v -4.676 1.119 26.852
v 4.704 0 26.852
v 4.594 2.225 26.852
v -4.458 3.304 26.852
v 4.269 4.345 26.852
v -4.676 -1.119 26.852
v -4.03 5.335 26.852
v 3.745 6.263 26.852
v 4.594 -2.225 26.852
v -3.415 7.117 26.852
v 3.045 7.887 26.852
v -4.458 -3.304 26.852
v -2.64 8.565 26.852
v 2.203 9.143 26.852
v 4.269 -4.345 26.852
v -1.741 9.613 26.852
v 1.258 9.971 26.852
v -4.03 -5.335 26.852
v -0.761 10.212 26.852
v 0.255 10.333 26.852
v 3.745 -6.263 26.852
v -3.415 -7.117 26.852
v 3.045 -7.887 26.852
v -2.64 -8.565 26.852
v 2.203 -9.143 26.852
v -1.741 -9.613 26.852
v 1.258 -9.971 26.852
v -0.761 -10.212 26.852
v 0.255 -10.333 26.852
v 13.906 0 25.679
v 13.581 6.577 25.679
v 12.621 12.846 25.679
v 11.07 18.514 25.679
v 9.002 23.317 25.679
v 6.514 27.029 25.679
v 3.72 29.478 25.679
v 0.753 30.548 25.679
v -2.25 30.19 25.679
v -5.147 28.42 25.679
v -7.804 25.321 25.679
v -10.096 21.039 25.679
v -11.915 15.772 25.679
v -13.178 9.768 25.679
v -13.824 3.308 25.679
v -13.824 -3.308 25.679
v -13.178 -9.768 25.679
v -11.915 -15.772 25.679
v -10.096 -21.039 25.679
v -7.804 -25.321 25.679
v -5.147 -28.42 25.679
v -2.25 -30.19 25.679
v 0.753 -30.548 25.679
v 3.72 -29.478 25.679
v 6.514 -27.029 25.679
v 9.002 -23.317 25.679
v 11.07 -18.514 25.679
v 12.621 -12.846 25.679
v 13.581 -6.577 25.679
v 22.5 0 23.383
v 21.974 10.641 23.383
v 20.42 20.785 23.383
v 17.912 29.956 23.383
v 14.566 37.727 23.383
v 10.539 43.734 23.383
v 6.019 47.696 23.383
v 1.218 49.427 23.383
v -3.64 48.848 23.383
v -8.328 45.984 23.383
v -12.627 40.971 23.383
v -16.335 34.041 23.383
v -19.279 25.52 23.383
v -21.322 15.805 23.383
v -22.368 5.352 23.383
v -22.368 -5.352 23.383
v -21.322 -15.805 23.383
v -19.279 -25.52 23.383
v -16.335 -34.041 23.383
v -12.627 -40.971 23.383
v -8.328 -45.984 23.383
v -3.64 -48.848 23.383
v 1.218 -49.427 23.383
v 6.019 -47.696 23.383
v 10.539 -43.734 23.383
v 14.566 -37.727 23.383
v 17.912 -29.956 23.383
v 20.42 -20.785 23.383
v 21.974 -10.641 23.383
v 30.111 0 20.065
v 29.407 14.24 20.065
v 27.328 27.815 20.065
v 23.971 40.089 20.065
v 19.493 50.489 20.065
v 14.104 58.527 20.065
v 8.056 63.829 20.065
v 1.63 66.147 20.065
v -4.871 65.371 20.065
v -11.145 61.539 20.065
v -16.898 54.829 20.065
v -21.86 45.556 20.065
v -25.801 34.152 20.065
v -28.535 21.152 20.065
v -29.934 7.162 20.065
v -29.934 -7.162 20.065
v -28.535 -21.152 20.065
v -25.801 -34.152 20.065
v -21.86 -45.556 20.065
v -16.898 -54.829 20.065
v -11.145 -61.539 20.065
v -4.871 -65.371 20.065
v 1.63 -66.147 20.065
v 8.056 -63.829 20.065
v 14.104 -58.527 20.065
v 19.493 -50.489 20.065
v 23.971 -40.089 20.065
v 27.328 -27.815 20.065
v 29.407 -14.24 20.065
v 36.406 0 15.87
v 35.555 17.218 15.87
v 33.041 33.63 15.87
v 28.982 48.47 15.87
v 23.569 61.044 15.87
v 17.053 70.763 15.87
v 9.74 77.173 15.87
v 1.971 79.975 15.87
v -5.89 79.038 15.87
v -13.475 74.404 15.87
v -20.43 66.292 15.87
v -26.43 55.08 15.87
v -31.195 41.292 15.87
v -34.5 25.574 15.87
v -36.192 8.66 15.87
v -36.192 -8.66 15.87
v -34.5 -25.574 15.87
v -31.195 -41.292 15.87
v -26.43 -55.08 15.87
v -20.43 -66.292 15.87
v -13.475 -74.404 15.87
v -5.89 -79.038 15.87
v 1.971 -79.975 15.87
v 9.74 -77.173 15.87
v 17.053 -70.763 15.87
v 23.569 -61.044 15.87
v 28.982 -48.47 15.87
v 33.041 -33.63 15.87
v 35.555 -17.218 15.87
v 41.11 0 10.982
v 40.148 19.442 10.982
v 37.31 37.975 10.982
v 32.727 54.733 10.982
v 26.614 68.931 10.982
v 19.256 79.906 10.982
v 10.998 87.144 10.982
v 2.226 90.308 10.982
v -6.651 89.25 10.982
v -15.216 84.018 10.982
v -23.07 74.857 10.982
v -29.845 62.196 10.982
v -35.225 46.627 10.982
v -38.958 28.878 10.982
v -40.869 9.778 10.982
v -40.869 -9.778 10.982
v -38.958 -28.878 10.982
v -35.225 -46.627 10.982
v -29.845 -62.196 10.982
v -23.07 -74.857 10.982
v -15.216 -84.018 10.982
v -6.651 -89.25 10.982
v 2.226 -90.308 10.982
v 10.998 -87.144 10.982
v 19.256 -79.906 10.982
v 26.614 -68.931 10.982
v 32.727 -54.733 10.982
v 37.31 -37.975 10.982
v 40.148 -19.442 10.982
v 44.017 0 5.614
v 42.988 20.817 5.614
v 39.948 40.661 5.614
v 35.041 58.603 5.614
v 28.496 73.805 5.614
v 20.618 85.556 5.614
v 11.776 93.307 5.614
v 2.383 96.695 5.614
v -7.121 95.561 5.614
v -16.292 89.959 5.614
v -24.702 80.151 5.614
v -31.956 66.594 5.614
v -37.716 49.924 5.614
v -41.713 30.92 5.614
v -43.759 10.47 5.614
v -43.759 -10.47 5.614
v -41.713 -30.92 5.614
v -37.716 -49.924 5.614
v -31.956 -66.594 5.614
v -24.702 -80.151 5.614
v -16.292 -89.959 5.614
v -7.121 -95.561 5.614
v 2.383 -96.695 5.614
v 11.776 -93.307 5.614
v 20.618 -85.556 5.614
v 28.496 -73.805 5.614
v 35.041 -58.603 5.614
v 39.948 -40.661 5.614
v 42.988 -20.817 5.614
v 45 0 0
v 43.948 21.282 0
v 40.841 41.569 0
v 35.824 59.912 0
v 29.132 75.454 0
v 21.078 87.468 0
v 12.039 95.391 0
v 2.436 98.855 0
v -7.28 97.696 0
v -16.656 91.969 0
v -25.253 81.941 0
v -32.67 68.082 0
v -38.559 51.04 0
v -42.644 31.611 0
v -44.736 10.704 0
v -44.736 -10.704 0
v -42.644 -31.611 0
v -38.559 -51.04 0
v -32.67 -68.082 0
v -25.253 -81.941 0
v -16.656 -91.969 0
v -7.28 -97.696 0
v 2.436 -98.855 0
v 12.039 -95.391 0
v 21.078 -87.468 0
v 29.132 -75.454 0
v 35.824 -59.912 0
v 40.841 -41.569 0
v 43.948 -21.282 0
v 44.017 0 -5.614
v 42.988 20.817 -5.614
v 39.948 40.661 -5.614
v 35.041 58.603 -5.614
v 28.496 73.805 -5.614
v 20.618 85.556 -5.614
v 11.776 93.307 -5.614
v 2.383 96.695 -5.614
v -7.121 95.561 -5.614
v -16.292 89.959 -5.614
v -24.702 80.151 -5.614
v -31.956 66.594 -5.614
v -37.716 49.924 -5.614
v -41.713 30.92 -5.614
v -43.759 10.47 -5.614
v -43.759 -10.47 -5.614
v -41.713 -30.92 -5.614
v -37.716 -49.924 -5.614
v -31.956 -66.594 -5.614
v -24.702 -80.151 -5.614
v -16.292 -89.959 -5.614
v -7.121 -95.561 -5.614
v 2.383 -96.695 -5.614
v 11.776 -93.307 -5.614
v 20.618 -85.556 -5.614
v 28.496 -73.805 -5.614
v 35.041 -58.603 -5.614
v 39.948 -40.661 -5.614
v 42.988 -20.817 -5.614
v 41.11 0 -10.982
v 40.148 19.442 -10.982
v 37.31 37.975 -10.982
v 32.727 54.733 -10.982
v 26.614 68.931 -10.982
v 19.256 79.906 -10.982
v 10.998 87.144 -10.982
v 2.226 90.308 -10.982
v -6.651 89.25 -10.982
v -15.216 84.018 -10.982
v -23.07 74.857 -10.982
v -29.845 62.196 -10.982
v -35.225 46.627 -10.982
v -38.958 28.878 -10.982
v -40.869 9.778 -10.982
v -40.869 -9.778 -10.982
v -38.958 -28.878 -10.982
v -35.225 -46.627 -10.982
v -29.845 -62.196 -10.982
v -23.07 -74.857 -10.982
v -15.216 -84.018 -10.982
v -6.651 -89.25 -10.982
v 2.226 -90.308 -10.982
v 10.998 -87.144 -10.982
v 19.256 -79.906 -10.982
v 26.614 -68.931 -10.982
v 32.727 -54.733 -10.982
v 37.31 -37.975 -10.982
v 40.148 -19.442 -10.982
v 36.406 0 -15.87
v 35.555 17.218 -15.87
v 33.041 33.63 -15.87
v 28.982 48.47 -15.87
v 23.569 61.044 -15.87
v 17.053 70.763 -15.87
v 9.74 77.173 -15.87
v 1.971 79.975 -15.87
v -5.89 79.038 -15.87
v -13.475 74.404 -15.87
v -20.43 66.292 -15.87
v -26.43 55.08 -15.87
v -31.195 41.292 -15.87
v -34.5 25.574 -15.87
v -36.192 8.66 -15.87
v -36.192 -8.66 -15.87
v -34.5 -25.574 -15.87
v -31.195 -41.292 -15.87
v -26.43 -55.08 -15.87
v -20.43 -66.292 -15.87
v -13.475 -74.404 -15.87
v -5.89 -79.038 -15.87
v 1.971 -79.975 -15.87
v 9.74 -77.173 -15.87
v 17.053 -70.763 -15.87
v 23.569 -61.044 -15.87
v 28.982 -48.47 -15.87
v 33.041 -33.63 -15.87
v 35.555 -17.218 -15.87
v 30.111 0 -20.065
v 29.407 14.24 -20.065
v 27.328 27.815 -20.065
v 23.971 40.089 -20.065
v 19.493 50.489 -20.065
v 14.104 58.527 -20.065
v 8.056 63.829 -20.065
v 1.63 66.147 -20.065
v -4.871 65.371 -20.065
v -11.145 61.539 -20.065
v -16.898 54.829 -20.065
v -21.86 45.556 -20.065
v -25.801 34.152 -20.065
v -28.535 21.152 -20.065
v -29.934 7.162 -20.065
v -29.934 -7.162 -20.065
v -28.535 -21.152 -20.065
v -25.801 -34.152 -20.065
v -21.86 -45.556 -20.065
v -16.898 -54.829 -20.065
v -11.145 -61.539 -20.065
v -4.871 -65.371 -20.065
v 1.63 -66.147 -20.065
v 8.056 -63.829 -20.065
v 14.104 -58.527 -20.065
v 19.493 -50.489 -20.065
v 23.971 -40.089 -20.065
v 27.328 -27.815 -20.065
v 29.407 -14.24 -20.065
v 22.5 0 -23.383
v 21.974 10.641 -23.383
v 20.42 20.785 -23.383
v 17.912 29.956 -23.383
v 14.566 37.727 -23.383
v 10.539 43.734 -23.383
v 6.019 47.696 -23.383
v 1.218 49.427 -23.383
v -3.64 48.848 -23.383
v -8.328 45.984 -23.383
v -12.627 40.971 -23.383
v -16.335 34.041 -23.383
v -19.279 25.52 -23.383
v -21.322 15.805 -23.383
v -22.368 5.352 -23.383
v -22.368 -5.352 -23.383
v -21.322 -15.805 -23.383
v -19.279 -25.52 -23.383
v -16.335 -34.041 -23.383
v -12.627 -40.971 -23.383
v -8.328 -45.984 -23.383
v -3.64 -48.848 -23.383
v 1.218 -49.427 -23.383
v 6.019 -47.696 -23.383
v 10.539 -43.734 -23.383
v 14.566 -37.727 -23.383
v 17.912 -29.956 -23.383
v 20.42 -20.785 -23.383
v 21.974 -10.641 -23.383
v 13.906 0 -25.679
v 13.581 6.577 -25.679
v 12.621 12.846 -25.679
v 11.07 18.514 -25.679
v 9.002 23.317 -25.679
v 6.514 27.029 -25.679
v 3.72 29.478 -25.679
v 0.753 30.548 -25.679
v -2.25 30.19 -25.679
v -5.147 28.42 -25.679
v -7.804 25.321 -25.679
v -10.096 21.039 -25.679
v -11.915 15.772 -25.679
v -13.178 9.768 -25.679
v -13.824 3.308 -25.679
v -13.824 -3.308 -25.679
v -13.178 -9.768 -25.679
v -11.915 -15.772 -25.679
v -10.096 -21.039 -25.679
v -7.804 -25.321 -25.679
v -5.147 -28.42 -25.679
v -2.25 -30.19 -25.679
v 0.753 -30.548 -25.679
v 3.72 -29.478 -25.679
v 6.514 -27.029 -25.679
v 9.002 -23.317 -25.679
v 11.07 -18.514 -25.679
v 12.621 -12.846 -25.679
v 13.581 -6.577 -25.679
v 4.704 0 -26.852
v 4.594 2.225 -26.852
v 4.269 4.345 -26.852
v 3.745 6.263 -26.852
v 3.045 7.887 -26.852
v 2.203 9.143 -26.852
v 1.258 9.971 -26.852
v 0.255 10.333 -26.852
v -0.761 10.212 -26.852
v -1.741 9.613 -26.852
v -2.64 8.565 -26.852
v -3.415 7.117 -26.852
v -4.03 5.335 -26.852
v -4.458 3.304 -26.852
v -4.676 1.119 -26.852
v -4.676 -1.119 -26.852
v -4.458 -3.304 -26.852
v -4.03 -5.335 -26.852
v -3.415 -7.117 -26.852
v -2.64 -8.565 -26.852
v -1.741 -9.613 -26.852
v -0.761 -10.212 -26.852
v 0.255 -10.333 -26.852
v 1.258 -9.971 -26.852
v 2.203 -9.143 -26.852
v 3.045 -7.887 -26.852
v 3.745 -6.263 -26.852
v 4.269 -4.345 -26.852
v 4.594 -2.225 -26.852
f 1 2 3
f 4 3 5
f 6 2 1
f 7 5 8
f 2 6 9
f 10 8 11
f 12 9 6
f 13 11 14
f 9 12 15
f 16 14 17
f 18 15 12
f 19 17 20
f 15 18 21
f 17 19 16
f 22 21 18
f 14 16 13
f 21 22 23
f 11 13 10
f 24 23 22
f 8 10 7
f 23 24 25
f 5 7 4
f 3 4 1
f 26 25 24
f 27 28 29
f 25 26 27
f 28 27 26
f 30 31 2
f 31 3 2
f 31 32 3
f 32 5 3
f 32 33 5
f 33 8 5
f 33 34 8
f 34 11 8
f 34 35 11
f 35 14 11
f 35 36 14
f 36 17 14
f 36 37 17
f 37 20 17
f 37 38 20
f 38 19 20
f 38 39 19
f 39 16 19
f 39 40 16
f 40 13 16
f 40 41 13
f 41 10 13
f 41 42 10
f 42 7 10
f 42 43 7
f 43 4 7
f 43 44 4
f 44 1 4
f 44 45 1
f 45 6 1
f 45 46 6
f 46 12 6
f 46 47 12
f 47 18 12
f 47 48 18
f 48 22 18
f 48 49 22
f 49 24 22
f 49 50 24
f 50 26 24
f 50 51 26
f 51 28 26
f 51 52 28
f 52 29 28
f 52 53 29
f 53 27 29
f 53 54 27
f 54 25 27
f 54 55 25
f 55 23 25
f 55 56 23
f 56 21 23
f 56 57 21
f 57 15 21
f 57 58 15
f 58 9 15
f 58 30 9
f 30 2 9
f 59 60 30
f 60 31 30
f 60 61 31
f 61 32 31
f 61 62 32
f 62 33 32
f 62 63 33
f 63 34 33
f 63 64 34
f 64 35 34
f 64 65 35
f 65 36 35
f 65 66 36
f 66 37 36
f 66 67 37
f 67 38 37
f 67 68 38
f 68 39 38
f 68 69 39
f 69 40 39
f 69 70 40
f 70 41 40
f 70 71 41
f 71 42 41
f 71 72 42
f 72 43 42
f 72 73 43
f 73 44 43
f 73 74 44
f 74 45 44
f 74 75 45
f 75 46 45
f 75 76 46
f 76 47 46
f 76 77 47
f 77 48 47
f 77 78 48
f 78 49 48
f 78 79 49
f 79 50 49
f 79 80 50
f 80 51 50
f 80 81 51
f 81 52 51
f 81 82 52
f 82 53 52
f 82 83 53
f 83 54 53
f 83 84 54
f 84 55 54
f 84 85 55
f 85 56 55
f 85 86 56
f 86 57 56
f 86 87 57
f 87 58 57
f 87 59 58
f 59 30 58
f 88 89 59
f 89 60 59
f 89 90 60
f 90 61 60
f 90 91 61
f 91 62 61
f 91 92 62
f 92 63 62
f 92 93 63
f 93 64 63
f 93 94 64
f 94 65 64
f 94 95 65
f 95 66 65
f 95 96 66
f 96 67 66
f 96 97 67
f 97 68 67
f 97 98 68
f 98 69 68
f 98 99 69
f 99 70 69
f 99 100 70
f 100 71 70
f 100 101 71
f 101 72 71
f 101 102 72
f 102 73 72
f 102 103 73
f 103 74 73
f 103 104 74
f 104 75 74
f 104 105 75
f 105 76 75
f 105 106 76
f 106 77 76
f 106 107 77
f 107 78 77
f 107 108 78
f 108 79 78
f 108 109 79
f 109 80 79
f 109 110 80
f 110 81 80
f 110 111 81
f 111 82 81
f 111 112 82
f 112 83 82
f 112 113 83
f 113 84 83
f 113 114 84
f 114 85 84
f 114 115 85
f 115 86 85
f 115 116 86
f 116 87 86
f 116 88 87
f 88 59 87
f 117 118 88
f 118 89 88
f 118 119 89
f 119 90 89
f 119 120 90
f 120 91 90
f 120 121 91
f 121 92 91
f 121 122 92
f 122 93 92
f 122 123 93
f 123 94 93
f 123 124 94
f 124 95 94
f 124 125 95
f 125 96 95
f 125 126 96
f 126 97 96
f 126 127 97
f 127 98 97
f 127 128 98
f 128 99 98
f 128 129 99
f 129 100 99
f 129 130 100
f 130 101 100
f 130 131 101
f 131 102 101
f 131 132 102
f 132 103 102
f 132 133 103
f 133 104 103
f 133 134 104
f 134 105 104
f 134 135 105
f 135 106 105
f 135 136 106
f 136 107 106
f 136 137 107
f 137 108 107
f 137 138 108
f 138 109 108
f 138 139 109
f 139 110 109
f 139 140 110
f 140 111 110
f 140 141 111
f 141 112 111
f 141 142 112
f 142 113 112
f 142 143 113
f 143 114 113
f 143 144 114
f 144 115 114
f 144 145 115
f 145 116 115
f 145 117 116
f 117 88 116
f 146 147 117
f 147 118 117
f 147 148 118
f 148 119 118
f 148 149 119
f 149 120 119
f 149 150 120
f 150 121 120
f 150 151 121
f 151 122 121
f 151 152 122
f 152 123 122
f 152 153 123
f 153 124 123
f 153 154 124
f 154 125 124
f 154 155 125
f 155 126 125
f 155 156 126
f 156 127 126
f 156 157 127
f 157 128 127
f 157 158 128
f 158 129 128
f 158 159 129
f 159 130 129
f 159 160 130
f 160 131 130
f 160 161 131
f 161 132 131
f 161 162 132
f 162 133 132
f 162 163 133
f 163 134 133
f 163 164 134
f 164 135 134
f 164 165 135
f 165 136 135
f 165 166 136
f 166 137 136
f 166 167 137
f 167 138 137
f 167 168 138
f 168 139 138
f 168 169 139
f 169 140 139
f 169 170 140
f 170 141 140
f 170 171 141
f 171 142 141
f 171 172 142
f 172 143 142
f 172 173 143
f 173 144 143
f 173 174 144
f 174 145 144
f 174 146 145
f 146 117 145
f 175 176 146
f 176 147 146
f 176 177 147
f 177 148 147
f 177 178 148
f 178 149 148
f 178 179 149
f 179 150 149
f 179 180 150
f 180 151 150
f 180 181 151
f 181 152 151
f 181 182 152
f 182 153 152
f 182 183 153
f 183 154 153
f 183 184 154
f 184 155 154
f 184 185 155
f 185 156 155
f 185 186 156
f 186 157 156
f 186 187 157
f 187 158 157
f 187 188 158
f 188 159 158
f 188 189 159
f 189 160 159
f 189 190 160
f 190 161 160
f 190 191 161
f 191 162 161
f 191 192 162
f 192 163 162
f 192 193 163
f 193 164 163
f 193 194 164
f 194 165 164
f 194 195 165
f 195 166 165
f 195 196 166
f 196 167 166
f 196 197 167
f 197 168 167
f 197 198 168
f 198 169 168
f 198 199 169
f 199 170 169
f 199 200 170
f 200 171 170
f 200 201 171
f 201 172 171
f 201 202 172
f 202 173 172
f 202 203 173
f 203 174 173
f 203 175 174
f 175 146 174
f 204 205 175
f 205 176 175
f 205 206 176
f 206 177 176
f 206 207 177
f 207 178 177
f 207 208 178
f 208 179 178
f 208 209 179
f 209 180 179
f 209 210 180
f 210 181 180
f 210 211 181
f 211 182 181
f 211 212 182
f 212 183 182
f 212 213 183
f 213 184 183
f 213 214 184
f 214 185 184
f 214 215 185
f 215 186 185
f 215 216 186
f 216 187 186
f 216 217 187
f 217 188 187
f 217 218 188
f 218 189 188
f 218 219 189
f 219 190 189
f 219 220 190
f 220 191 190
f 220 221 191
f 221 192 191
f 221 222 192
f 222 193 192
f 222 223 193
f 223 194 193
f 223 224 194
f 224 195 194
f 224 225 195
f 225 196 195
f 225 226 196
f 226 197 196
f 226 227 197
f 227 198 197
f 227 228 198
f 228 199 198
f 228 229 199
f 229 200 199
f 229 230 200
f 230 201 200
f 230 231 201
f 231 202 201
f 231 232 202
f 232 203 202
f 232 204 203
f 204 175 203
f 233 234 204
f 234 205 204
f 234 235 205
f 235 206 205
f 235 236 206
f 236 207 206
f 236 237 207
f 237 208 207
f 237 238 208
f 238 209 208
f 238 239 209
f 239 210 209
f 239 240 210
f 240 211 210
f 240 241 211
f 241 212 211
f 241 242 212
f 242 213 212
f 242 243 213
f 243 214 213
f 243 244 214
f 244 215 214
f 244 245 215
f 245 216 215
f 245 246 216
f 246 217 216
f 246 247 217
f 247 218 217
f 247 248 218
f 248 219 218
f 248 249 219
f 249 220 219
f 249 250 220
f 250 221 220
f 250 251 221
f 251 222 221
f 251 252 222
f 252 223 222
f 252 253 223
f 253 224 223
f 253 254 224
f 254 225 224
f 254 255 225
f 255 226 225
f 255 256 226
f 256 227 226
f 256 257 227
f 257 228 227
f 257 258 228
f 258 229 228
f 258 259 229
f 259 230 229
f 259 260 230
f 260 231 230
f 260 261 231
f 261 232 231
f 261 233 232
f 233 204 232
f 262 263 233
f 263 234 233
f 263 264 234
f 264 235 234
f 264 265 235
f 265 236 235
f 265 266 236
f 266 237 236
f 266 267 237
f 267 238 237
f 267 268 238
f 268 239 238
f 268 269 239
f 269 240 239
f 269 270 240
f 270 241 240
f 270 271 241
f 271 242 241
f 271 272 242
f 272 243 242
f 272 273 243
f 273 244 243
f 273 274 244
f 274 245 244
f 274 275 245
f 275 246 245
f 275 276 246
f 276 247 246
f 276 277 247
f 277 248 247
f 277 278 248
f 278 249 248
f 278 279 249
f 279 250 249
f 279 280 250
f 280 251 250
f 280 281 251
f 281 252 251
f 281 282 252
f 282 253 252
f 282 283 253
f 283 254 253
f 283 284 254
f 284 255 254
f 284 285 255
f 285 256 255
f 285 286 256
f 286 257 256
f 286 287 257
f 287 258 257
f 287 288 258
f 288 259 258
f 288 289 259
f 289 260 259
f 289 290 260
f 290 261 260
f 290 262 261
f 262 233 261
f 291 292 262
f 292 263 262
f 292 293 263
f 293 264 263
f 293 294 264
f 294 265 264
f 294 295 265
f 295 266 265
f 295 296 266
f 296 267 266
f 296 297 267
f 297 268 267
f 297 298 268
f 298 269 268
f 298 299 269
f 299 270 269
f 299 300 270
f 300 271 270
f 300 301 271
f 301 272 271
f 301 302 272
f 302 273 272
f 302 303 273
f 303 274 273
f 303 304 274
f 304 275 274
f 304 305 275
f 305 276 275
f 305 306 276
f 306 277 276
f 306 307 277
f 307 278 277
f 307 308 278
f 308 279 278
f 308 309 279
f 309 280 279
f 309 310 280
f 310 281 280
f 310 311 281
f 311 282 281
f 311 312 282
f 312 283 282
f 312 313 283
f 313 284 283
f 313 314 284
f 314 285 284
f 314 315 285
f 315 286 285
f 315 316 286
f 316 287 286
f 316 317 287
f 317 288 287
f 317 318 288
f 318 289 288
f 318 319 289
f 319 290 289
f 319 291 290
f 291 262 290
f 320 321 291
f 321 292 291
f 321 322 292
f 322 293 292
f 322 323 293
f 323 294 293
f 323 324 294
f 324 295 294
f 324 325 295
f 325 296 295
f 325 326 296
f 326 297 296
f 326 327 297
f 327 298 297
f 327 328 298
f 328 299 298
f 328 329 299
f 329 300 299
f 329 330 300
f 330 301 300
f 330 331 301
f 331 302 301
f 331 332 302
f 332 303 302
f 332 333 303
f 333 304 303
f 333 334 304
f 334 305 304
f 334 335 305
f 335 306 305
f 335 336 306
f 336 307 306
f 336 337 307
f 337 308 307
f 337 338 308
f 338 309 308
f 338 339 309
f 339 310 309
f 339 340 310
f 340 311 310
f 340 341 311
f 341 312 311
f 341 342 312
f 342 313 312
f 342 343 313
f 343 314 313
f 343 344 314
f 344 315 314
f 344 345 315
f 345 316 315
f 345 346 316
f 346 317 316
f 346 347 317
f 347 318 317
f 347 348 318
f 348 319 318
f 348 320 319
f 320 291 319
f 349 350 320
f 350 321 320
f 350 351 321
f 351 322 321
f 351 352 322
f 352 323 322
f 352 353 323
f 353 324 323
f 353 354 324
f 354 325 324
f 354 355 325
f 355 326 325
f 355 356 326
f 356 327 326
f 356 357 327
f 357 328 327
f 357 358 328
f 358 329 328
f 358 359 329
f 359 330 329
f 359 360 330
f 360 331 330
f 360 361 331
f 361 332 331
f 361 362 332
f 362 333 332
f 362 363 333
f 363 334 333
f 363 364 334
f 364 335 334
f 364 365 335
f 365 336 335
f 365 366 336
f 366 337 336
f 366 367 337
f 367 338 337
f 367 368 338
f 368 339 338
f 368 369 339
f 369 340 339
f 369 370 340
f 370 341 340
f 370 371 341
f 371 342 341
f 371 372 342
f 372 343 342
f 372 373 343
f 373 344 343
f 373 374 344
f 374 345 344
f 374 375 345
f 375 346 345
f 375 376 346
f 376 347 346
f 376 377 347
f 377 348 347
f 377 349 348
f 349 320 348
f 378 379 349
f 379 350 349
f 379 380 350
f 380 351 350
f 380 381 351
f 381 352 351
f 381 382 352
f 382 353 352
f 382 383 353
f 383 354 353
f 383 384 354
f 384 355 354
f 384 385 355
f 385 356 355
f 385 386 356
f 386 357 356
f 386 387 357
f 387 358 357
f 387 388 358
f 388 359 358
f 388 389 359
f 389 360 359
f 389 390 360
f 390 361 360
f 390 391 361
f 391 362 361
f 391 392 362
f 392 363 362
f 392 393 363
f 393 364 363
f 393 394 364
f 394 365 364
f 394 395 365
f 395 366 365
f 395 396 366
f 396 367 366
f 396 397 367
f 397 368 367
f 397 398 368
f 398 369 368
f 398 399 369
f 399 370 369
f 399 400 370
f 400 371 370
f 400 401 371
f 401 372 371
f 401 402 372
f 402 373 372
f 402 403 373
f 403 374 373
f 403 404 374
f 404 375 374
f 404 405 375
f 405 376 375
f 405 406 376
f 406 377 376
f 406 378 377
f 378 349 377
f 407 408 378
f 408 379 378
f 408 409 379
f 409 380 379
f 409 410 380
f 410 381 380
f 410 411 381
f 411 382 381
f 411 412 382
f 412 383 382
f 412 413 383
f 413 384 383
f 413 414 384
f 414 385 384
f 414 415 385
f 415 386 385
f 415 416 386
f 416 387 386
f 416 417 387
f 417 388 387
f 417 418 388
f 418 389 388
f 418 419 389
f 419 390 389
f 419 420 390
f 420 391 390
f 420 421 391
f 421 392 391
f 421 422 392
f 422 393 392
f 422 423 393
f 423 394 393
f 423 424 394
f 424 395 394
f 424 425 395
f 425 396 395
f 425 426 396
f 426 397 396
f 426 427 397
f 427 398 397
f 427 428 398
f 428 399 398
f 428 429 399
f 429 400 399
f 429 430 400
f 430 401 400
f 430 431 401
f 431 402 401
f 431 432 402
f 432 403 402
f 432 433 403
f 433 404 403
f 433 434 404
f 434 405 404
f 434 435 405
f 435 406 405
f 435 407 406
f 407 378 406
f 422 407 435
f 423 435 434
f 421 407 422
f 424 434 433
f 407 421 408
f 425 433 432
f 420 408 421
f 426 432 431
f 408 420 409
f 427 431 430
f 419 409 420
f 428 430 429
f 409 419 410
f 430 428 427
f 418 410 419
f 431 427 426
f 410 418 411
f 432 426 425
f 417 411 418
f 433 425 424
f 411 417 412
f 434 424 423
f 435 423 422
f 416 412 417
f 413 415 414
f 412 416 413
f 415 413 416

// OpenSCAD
// Generated by SolidPython 1.0.1 on 2020-07-29 00:46:46


scale(v = [5, 11, 3]) {
	sphere(r = 9);
}
/***********************************************
*********      SolidPython code:      **********
************************************************
 
# import packages: SolidPython
from solid import *
from solid.utils import *
from itertools import chain, combinations, permutations


class Resize:

    def __init__(self, scad_file):
        self.scad_file = scad_file
        #self.scad_file = import_scad(scad_file)
        # cone/cylinder param:
        self.r1 = 0
        self.r2 = 0
        self.h = 0
        # rectangular prism param:
        self.w = 0
        self.l = 0
        # ellipse param:
        self.r = 0

    # import OpenScad code (file name corresponds to shape)


    # classify shape + parameters
    def assign(self, param1, param2, param3):
        if self.scad_file == 'cone.scad':
            self.r1 = param1
            self.r2 = param2
            self.h = param3
        elif self.scad_file == 'cylinder.scad':
            self.r1 = param1
            self.r2 = param2
            self.h = param3
        elif self.scad_file == 'rectangularPrism.scad':
            self.h = param1
            self.l = param2
            self.w = param3
        else:
            self.r = param1
            self.h = param2

    # resize parameters
    def iterate(self):
        x = range(3, 20, 2)
        i = 1
        if self.scad_file == 'cone.scad':
            tempList = list(permutations(x, 2))
            for temp in tempList:
                param1 = temp[0]
                param2 = temp[1]
                filepath = 'produced_scad_files/' + 'cone' + str(param1) + '_' + str(param2) + '_' + '.scad'
                scad_render_to_file(cylinder(h=param1, r1=param2, r2=0), filepath)

        elif self.scad_file == 'cylinder.scad':
            tempList = list(permutations(x, 3))
            for temp in tempList:
                param1 = temp[0]
                param2 = temp[1]
                filepath = 'produced_scad_files/' + 'cylinder' + str(param1) + '_' + str(param2) + '_' + '.scad'
                scad_render_to_file(cylinder(h=param1, r1=param2, r2=param2), filepath)

        elif self.scad_file == 'rectangularPrism.scad':
            tempList = list(permutations(x, 3))
            for temp in tempList:
                param1 = temp[0]
                param2 = temp[1]
                param3 = temp[2]
                filepath = 'produced_scad_files/' + 'rectangularPrism' + str(param1) + '_' + str(param2) + '_' + str(
                    param3) + '.scad'
                scad_render_to_file(cube(size=(param1, param2, param3)), filepath)

        elif self.scad_file == 'ellipse.scad':
            tempList = list(permutations(x, 4))
            for temp in tempList:
                param1 = temp[0]
                param2 = temp[1]
                param3 = temp[2]
                param4 = temp[3]
                filepath = 'produced_scad_files/' + 'ellipse' + str(param1) + '_' + str(param2) + '_' + str(param3) + '_' + str(param4) + '.scad'
                scad_render_to_file(scale([param1, param2, param3])(sphere(r=param4)), filepath)

    def render_to_scadfile(self):
        scad_render_to_file(scad, 'example.scad') 
 
************************************************/
